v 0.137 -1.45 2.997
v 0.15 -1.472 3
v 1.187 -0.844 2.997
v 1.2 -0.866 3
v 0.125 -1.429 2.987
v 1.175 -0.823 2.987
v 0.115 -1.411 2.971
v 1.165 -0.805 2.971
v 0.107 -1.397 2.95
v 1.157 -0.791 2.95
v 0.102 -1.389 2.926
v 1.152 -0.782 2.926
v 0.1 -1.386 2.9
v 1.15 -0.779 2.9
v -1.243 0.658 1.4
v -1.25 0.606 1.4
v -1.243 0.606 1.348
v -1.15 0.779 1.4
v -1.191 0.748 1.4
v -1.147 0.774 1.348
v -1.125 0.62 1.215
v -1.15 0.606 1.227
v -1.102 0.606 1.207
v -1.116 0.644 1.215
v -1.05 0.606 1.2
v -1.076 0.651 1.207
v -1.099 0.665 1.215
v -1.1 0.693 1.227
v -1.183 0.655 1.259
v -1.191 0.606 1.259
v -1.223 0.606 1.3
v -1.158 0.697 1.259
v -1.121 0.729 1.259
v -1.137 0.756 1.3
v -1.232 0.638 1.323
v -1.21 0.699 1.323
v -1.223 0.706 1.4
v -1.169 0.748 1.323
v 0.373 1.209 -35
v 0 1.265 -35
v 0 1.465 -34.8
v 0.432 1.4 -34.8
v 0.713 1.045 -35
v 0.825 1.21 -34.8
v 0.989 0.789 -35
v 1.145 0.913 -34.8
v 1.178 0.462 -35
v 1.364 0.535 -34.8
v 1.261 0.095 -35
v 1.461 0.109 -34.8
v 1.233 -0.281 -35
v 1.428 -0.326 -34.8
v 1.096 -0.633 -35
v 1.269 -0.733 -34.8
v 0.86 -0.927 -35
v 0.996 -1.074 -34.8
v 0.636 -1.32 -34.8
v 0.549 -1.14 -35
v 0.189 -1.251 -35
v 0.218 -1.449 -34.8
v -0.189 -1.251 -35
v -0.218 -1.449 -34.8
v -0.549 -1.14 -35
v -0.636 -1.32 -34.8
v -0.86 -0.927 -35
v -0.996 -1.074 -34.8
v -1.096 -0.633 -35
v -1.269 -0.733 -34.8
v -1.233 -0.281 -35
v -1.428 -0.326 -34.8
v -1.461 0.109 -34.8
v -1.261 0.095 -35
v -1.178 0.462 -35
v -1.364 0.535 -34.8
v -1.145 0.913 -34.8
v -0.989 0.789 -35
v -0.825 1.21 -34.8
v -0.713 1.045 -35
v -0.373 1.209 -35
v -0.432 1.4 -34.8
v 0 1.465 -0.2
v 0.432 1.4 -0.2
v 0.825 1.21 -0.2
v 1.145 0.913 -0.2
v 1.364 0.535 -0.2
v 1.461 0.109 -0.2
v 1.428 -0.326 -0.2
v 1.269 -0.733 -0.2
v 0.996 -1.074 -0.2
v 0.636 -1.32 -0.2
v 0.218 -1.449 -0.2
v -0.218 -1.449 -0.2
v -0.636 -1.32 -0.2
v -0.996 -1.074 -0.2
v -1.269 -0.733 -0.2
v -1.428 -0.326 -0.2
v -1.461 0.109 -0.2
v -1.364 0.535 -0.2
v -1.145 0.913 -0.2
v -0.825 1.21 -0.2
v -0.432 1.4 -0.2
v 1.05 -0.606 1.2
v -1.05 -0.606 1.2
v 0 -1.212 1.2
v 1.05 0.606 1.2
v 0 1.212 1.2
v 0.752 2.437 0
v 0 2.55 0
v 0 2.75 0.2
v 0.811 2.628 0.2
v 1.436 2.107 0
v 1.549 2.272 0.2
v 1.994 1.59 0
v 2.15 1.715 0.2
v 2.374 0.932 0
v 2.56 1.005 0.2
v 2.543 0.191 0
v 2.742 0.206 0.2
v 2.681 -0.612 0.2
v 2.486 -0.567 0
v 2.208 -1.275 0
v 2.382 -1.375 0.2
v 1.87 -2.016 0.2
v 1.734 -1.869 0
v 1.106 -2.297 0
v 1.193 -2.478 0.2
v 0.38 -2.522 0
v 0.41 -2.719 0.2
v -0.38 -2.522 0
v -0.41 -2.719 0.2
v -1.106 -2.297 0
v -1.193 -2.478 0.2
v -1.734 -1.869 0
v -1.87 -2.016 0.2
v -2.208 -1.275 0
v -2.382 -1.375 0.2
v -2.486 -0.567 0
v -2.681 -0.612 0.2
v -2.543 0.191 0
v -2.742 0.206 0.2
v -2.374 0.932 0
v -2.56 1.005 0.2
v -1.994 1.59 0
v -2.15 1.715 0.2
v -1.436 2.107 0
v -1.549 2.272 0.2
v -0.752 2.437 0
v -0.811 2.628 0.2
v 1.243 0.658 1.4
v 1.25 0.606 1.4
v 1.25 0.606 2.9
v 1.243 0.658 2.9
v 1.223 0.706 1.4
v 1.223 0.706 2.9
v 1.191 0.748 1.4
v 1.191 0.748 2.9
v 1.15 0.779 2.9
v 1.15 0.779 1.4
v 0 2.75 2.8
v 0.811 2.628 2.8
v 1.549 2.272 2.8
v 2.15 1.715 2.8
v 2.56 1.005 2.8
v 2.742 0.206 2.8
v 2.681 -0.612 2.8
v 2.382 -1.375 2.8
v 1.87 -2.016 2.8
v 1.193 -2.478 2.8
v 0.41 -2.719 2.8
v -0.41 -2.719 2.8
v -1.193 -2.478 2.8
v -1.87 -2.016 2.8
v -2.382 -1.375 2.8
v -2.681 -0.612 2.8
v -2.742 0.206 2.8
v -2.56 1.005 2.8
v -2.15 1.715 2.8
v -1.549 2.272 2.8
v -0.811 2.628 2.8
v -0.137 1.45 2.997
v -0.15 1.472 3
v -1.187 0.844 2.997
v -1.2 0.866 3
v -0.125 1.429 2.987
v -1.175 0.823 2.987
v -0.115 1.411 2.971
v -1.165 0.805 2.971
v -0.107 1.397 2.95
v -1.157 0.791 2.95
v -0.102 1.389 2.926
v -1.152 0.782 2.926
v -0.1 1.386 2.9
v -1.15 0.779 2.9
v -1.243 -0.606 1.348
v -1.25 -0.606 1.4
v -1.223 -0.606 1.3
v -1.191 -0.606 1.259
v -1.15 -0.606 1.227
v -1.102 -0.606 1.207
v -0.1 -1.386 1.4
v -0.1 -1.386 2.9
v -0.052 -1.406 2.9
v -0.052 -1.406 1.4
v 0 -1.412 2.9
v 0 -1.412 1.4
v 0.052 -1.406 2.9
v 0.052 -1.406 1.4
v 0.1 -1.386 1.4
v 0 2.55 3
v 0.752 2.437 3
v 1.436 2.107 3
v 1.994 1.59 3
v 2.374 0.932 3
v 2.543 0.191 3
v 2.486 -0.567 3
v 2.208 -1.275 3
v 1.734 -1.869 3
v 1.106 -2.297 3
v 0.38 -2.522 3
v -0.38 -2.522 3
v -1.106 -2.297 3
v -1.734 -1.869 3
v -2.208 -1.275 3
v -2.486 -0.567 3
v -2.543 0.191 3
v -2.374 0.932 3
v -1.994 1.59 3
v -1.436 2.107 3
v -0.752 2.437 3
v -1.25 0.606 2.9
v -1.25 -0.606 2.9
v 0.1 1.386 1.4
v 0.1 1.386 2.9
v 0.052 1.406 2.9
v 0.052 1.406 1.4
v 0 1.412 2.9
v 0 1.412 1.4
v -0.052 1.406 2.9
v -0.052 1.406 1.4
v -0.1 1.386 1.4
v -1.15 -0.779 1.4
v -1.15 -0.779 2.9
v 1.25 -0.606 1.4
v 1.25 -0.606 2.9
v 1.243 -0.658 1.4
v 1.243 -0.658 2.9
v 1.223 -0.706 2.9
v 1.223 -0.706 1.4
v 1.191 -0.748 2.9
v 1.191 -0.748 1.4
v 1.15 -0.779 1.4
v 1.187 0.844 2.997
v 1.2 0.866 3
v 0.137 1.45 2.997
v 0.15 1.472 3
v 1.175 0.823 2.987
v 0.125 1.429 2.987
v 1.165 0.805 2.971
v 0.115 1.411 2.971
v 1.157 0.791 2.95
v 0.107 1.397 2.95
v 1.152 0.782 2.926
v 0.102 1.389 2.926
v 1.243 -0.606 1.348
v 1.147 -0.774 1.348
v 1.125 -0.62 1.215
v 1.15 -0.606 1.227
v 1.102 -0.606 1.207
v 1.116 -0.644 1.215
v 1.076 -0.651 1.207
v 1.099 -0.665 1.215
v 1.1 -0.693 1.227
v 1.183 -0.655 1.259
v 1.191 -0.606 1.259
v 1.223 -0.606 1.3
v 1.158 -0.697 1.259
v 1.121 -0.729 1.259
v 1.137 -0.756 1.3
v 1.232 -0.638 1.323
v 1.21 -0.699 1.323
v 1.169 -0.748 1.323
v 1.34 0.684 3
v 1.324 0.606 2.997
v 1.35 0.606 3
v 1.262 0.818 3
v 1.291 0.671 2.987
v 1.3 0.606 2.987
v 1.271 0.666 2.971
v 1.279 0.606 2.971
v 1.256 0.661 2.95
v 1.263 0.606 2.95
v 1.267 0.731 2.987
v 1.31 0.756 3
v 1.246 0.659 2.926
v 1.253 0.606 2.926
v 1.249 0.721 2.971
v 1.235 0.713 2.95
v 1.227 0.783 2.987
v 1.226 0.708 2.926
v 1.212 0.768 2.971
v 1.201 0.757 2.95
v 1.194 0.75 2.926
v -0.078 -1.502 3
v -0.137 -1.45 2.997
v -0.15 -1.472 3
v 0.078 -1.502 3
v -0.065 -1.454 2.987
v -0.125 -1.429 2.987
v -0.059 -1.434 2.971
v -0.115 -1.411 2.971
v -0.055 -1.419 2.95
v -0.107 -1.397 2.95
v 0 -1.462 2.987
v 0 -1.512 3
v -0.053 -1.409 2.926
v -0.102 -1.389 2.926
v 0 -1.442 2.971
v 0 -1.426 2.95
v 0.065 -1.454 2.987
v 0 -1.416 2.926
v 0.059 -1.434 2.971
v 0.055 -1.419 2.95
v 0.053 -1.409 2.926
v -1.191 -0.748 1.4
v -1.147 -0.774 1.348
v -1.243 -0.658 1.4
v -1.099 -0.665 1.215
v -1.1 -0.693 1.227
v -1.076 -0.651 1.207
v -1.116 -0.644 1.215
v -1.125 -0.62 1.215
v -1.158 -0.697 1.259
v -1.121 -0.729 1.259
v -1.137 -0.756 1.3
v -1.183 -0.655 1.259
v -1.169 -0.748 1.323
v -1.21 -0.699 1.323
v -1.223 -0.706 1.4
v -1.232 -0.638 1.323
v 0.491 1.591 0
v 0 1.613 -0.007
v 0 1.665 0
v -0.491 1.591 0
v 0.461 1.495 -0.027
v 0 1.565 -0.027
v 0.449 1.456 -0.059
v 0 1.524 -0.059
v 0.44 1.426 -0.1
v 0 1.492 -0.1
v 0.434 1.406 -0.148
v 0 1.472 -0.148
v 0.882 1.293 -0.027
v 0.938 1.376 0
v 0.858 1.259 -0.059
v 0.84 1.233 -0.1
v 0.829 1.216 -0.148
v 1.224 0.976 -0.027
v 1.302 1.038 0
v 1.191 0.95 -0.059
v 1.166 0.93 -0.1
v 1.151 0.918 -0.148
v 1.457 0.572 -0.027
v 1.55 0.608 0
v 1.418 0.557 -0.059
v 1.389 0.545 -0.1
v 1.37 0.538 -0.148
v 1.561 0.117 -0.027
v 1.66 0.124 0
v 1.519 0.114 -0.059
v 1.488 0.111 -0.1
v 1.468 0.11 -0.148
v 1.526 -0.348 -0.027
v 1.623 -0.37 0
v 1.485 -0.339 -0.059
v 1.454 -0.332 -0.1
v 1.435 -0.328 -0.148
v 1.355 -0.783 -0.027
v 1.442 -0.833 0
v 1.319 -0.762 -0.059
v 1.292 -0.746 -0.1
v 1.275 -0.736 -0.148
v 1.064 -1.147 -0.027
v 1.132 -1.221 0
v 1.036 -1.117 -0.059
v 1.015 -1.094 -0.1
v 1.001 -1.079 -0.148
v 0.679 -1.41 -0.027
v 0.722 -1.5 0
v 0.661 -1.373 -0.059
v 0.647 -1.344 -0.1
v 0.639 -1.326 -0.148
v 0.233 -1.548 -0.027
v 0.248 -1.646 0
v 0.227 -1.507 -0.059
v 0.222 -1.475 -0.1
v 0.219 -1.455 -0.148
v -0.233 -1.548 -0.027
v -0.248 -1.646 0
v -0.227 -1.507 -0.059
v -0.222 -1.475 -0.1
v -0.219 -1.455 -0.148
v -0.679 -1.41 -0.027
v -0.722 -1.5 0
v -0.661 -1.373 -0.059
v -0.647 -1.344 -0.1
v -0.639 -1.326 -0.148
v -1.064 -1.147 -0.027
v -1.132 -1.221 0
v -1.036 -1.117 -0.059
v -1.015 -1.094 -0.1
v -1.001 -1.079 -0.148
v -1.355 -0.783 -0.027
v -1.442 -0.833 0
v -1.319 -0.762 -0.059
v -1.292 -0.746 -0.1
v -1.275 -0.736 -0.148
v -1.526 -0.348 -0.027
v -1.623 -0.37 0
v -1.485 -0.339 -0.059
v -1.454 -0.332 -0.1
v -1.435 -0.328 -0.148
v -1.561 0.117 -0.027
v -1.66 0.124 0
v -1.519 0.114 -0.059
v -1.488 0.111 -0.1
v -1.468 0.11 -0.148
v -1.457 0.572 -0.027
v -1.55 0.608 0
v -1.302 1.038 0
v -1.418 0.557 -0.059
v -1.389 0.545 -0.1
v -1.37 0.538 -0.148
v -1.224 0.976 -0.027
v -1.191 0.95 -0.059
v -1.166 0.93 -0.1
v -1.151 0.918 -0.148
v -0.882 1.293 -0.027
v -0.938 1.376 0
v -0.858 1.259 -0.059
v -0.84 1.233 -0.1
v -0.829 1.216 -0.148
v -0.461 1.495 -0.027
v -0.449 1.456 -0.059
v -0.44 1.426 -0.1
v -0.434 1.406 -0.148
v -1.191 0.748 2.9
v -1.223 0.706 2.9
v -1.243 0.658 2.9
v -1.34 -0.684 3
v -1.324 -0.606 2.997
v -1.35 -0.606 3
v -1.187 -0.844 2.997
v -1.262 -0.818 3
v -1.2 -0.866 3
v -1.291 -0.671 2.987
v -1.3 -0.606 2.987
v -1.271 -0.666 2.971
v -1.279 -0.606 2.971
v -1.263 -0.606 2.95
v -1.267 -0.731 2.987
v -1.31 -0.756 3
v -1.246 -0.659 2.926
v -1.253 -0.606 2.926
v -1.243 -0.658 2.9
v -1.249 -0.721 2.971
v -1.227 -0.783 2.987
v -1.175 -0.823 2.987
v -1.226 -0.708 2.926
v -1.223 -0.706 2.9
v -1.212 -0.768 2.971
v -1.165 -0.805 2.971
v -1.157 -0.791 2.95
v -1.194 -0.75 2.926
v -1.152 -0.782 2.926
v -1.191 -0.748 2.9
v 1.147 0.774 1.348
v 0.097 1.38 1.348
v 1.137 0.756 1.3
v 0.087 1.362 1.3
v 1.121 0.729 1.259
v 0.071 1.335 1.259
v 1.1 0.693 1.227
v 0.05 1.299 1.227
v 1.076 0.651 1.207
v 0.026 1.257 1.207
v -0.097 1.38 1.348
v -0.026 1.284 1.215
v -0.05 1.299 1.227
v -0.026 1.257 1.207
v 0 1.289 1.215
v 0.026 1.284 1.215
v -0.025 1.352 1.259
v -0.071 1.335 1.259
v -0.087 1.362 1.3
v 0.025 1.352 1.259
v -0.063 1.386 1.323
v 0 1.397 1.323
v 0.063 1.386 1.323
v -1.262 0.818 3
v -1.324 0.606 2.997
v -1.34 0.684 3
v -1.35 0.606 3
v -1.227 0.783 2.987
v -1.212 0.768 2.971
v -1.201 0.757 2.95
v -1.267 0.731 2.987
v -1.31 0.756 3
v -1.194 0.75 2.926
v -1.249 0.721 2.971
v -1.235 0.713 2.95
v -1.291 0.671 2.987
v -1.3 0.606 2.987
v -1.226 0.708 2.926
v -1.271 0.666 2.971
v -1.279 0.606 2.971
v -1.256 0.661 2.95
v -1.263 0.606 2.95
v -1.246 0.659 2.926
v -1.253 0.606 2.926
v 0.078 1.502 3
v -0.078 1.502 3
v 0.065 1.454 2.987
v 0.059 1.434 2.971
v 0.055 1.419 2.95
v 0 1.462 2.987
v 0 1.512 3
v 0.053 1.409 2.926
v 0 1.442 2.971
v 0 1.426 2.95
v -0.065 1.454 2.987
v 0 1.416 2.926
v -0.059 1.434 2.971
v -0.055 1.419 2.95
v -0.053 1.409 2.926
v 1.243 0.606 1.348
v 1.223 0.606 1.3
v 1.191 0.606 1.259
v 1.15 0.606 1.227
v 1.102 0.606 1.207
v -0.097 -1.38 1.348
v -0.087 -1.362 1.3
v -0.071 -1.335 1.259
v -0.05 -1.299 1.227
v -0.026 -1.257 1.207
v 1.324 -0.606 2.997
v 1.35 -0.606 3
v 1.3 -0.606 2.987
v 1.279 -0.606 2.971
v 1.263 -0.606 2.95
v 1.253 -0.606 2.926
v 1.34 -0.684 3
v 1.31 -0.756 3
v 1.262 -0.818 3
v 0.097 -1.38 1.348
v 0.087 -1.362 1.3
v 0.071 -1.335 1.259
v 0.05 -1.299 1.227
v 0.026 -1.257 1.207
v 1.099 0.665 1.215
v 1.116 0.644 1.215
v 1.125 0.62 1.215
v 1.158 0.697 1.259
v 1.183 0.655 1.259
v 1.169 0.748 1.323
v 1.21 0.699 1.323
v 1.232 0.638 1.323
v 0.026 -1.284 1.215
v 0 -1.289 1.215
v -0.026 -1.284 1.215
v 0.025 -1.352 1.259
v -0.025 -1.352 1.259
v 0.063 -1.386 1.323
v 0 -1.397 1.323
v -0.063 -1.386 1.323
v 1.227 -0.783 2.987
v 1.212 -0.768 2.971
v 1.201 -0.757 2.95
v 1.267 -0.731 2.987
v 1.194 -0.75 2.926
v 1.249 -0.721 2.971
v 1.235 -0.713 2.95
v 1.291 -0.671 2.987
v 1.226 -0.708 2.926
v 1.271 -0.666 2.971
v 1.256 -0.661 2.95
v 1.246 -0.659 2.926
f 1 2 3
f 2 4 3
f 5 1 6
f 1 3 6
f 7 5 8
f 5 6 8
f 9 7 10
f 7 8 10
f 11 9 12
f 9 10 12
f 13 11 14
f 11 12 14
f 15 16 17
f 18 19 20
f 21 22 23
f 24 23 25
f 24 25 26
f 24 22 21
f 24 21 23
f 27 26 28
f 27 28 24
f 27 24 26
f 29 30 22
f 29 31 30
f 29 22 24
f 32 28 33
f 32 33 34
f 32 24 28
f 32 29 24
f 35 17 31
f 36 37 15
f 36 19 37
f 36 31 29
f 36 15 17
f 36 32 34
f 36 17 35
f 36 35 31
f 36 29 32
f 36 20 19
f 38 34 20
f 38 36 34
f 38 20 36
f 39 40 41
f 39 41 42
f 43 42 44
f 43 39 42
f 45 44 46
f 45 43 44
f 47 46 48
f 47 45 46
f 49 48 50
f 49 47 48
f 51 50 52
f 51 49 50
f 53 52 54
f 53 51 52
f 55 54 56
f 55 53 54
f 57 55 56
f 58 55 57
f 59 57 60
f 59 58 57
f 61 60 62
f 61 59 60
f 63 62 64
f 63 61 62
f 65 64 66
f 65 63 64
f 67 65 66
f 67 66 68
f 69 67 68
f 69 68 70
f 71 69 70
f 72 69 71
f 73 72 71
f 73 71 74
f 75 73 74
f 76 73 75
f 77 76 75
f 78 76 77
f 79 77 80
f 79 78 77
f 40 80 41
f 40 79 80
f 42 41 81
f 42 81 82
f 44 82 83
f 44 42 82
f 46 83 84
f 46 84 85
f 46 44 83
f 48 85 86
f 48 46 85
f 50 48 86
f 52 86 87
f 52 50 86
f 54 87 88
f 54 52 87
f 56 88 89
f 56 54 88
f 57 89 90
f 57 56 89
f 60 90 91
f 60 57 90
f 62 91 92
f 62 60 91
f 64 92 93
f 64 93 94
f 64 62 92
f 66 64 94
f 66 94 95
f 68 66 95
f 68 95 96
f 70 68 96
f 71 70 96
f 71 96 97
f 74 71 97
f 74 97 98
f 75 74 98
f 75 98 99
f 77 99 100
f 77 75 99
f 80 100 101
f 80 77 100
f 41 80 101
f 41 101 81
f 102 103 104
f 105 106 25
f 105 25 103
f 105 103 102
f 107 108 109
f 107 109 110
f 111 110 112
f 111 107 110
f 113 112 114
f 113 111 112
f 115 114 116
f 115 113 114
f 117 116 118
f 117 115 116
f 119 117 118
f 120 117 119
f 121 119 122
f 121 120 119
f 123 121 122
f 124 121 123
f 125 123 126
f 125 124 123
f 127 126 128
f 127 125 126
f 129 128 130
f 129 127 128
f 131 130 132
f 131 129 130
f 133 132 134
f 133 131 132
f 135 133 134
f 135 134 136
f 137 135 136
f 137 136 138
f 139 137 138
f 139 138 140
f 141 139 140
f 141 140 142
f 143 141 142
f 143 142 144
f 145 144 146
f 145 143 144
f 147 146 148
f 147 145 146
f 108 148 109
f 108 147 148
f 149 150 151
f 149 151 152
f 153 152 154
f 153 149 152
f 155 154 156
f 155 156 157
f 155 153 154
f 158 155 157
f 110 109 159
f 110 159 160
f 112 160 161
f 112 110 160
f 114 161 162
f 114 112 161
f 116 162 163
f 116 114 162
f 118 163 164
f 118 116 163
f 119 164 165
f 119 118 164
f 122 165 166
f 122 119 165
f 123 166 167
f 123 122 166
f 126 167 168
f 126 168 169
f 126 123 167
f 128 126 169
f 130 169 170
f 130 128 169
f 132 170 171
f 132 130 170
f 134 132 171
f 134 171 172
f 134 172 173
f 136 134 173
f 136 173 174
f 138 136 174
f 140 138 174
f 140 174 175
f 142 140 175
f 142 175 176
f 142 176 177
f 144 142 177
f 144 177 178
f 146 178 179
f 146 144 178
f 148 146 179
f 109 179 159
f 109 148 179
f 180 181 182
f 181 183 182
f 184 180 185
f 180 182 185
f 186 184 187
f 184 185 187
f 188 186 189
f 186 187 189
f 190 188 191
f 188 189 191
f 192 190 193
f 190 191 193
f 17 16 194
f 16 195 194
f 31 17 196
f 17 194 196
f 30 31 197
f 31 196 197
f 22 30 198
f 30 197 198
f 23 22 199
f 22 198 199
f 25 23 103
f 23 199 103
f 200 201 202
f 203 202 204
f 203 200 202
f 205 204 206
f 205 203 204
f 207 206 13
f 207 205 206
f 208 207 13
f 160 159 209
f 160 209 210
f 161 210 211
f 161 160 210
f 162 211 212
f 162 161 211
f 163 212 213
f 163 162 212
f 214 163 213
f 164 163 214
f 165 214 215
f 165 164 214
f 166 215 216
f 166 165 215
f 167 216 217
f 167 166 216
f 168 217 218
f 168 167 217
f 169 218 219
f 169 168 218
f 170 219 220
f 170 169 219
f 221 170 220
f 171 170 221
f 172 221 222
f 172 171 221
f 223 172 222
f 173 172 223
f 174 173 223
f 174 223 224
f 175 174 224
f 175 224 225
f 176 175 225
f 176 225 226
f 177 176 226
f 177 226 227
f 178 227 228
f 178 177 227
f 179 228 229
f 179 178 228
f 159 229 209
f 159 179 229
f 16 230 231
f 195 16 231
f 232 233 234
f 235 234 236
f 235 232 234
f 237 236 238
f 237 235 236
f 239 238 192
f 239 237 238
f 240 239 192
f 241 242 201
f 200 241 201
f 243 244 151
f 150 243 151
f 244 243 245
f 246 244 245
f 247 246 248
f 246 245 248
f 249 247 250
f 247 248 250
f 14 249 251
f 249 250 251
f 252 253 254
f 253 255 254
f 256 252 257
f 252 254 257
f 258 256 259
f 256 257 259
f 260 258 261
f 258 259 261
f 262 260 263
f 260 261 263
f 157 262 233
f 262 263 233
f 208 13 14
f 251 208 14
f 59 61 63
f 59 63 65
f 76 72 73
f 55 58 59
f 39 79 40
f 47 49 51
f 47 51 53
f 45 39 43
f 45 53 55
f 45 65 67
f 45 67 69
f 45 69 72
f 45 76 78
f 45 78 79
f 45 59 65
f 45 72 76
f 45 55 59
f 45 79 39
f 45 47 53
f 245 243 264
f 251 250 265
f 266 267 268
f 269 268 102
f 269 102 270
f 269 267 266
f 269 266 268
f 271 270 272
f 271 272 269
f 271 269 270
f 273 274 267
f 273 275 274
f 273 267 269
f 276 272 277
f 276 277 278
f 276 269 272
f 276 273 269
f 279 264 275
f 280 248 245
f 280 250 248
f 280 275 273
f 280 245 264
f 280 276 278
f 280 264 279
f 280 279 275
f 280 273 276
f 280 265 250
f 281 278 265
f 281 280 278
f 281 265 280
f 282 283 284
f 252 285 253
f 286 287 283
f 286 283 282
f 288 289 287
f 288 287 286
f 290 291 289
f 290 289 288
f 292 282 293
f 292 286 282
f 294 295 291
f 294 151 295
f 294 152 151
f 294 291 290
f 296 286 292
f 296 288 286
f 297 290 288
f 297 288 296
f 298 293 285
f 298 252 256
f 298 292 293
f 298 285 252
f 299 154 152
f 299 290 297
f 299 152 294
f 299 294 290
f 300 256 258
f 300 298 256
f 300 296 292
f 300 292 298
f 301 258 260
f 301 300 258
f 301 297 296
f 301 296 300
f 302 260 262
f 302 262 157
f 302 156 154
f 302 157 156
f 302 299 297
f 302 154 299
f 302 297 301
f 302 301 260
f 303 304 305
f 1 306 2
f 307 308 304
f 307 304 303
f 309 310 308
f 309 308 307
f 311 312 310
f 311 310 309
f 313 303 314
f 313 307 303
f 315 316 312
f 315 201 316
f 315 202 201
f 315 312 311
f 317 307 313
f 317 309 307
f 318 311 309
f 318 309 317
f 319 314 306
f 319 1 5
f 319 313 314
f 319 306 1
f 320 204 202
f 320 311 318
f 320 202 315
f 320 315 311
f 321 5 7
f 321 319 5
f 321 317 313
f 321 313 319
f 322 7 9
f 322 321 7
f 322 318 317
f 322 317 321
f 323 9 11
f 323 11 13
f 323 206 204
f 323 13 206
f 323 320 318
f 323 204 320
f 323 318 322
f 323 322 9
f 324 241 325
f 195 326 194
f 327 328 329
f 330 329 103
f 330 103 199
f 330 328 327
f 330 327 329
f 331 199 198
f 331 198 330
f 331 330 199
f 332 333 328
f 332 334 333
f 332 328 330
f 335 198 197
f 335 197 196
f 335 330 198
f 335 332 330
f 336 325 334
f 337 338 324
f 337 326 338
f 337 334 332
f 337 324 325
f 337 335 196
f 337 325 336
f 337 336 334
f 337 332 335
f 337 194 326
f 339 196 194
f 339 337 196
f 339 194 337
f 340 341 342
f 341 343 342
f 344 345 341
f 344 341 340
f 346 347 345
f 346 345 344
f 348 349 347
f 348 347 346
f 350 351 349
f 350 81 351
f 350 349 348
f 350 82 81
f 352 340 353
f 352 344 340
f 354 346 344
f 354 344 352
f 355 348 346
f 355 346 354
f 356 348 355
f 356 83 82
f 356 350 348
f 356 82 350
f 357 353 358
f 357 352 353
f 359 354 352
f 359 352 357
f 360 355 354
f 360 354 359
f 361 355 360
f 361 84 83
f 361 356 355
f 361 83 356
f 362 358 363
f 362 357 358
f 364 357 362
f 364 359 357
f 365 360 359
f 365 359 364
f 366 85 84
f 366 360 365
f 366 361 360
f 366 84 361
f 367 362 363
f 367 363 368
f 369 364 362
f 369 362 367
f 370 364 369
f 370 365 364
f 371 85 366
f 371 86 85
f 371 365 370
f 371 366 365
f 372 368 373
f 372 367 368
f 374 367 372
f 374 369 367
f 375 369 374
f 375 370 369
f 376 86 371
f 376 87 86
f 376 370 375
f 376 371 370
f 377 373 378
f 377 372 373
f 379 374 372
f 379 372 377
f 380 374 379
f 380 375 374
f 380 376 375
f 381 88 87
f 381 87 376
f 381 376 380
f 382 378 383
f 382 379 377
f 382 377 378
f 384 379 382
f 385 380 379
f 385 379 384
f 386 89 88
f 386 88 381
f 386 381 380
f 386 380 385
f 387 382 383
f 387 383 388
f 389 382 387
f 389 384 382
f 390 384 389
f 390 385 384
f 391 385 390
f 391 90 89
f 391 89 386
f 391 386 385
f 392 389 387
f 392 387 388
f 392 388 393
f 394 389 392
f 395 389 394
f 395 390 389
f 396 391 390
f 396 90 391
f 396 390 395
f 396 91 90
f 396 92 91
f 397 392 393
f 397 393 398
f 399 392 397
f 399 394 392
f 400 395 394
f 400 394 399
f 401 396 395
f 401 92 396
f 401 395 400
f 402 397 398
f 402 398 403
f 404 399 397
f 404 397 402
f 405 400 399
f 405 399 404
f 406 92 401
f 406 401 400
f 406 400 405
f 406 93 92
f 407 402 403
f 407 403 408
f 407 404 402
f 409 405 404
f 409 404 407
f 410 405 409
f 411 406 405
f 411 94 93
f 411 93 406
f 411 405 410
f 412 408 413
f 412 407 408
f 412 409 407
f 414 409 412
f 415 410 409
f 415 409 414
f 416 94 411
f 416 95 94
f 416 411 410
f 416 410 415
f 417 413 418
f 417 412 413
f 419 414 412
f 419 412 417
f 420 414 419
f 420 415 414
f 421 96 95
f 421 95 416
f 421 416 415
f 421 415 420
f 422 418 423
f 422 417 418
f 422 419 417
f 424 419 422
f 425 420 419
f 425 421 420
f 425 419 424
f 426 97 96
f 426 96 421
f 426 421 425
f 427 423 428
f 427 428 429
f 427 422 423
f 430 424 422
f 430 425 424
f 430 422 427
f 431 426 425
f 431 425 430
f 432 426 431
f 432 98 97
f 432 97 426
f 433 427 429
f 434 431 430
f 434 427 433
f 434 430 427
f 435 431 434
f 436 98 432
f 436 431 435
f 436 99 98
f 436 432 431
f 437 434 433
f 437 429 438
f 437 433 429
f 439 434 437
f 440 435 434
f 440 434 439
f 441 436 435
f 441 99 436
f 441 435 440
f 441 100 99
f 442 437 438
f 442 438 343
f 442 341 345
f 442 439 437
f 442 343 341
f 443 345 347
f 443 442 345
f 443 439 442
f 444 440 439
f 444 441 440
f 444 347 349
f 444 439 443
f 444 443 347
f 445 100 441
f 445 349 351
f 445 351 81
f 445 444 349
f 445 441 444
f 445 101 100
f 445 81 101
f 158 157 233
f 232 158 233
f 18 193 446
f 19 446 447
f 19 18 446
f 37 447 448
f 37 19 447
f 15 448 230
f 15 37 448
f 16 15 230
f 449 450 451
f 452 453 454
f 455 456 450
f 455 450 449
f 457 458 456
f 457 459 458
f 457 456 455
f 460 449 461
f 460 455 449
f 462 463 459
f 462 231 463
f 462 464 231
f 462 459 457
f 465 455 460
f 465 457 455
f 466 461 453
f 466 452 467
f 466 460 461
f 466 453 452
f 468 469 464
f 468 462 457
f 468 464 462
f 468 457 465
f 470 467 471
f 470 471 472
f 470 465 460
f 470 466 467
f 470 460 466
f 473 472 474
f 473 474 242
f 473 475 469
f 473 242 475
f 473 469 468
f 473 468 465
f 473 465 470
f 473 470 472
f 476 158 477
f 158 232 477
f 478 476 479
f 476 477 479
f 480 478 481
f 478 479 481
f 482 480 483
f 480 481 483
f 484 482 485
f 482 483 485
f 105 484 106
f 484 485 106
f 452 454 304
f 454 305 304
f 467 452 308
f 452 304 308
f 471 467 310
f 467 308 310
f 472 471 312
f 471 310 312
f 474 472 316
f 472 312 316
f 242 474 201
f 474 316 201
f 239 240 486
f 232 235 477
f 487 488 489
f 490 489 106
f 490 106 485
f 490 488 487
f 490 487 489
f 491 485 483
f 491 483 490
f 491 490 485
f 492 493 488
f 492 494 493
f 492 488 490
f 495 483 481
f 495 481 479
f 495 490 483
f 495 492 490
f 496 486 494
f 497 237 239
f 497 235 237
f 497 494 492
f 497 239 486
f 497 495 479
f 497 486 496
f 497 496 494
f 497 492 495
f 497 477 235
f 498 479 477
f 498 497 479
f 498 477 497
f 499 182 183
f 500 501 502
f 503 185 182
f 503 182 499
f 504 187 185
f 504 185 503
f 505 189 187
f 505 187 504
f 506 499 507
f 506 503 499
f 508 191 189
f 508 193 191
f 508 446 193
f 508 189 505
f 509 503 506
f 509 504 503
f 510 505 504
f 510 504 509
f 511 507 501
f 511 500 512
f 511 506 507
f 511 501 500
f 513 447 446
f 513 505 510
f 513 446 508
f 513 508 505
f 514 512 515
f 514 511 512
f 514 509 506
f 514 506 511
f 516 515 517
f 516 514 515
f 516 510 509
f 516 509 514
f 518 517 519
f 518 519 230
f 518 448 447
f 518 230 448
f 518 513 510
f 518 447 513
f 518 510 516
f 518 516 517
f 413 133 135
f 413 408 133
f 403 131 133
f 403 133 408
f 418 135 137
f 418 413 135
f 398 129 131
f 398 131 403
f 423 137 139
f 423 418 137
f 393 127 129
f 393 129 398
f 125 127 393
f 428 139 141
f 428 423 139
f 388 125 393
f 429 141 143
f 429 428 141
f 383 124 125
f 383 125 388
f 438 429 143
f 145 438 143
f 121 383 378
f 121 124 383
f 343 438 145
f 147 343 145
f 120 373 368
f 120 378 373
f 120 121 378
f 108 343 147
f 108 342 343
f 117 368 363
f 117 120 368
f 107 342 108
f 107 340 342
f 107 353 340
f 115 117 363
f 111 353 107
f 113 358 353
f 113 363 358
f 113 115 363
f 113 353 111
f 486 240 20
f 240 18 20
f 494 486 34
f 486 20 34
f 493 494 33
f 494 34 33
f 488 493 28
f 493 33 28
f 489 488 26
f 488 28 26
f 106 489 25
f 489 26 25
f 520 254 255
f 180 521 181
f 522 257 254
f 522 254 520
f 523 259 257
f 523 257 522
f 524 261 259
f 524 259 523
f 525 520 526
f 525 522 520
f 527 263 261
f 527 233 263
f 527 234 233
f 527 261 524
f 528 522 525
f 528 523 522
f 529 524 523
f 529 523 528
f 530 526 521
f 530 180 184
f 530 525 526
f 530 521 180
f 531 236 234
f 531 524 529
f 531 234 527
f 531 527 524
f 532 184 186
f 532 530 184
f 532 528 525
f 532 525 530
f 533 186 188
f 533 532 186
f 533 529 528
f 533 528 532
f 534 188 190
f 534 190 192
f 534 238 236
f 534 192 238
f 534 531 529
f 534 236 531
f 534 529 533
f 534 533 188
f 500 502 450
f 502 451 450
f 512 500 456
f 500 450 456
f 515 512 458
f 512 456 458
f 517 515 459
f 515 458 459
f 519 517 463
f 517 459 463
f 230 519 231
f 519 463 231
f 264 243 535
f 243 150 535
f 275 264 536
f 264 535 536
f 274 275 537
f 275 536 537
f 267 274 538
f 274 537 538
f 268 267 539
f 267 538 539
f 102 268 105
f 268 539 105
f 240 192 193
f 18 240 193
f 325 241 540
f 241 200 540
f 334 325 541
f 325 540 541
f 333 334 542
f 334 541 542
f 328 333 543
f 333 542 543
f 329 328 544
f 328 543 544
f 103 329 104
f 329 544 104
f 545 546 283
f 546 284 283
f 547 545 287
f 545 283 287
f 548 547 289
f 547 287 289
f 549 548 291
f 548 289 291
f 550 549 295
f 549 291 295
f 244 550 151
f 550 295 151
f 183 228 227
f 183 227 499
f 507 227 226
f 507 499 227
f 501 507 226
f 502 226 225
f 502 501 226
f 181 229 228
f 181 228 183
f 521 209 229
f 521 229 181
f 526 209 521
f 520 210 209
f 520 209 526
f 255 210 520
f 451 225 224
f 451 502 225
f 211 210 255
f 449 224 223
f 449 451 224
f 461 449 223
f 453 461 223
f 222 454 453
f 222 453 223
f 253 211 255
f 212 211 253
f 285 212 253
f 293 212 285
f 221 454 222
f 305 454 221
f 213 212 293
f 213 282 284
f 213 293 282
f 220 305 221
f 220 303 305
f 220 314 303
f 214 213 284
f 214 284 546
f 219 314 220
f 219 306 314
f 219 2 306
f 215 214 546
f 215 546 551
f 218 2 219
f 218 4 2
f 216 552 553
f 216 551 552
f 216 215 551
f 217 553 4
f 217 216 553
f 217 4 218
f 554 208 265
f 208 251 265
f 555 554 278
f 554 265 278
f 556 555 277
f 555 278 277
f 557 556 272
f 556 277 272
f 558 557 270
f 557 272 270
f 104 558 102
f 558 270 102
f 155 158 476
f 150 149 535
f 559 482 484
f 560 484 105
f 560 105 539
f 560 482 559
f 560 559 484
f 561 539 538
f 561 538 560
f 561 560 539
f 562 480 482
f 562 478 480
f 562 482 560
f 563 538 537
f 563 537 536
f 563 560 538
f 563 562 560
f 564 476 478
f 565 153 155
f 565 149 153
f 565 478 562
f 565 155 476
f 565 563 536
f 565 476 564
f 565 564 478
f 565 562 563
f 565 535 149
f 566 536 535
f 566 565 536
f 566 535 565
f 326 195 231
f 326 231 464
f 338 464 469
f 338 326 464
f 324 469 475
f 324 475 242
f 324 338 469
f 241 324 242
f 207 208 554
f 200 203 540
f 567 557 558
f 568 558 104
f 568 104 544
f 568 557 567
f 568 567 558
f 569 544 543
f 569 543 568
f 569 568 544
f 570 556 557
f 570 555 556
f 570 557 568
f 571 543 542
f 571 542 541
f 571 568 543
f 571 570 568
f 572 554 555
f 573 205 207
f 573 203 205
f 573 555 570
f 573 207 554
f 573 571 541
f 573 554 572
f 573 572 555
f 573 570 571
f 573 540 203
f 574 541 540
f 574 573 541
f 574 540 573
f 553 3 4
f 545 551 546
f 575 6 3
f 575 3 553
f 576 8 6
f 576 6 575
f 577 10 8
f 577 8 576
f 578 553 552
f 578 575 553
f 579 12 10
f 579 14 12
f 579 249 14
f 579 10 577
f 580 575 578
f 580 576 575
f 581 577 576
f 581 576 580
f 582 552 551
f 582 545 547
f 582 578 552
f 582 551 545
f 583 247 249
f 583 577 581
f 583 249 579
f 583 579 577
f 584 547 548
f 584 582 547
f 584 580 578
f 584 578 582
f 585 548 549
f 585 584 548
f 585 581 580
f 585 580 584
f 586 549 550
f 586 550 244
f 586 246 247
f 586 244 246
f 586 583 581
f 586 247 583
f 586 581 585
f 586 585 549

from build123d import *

# Parameters (mm, degrees)
SCHNITT_LINEAR_AUSTRAGEN1_DEPTH = 1.8
FASE1_SIZE                      = 0.2
VERRUNDUNG1_R                   = 0.2
VERRUNDUNG2_R                   = 0.1


with BuildPart() as part:
    # Skizze1 → Rotation1 (revolve)
    with BuildSketch(Plane(origin=(0, 0, 0), x_dir=(0, 0, -1), z_dir=(1, 0, 0))):
        Polygon((-3, 0), (-3, 2.75), (0, 2.75), (0, 1.465), (35, 1.465), (35, 0), align=None)
    revolve(axis=Axis((0, 0, 21.919879518), (0, 0, -1)))

    # Skizze2 → Schnitt-Linear austragen1 (cut)
    with BuildSketch(Plane.XY.offset(3)):
        Polygon((1.25, -0.721687836), (1.25, 0.721687836), (0, 1.443375673), (-1.25, 0.721687836), (-1.25, -0.721687836), (0, -1.443375673), align=None)
    extrude(amount=-SCHNITT_LINEAR_AUSTRAGEN1_DEPTH, mode=Mode.SUBTRACT)

    # Fase1
    fase1_edges = [part.edges().sort_by_distance(p)[0] for p in [
        (0, -1.465, -35),
        (0, -2.75, 0),
        (0, -2.75, 3),
    ]]
    chamfer(fase1_edges, length=FASE1_SIZE)

    # Verrundung1
    verrundung1_edges = [part.edges().sort_by_distance(p)[0] for p in [
        (0.625, -1.082531755, 1.2),
        (1.25, -0.721687836, 2.1),
        (-0.625, -1.082531755, 1.2),
        (0, -1.443375673, 2.1),
        (-1.25, 0, 1.2),
        (-1.25, -0.721687836, 2.1),
        (-0.625, 1.082531755, 1.2),
        (-1.25, 0.721687836, 2.1),
        (0.625, 1.082531755, 1.2),
        (0, 1.443375673, 2.1),
        (1.25, 0, 1.2),
        (1.25, 0.721687836, 2.1),
        (0, -1.465, 0),
    ]]
    fillet(verrundung1_edges, radius=VERRUNDUNG1_R)

    # Verrundung2
    verrundung2_edges = [part.edges().sort_by_distance(p)[0] for p in [
        (-0.625, -1.082531755, 3),
        (-1.25, 0, 3),
        (-0.625, 1.082531755, 3),
        (0.625, 1.082531755, 3),
        (1.25, 0, 3),
        (0.625, -1.082531755, 3),
        (-1.223205081, -0.706217783, 3),
        (0, -1.412435565, 3),
        (1.223205081, -0.706217783, 3),
        (1.223205081, 0.706217783, 3),
        (0, 1.412435565, 3),
        (-1.223205081, 0.706217783, 3),
    ]]
    fillet(verrundung2_edges, radius=VERRUNDUNG2_R)


solid = part.part
